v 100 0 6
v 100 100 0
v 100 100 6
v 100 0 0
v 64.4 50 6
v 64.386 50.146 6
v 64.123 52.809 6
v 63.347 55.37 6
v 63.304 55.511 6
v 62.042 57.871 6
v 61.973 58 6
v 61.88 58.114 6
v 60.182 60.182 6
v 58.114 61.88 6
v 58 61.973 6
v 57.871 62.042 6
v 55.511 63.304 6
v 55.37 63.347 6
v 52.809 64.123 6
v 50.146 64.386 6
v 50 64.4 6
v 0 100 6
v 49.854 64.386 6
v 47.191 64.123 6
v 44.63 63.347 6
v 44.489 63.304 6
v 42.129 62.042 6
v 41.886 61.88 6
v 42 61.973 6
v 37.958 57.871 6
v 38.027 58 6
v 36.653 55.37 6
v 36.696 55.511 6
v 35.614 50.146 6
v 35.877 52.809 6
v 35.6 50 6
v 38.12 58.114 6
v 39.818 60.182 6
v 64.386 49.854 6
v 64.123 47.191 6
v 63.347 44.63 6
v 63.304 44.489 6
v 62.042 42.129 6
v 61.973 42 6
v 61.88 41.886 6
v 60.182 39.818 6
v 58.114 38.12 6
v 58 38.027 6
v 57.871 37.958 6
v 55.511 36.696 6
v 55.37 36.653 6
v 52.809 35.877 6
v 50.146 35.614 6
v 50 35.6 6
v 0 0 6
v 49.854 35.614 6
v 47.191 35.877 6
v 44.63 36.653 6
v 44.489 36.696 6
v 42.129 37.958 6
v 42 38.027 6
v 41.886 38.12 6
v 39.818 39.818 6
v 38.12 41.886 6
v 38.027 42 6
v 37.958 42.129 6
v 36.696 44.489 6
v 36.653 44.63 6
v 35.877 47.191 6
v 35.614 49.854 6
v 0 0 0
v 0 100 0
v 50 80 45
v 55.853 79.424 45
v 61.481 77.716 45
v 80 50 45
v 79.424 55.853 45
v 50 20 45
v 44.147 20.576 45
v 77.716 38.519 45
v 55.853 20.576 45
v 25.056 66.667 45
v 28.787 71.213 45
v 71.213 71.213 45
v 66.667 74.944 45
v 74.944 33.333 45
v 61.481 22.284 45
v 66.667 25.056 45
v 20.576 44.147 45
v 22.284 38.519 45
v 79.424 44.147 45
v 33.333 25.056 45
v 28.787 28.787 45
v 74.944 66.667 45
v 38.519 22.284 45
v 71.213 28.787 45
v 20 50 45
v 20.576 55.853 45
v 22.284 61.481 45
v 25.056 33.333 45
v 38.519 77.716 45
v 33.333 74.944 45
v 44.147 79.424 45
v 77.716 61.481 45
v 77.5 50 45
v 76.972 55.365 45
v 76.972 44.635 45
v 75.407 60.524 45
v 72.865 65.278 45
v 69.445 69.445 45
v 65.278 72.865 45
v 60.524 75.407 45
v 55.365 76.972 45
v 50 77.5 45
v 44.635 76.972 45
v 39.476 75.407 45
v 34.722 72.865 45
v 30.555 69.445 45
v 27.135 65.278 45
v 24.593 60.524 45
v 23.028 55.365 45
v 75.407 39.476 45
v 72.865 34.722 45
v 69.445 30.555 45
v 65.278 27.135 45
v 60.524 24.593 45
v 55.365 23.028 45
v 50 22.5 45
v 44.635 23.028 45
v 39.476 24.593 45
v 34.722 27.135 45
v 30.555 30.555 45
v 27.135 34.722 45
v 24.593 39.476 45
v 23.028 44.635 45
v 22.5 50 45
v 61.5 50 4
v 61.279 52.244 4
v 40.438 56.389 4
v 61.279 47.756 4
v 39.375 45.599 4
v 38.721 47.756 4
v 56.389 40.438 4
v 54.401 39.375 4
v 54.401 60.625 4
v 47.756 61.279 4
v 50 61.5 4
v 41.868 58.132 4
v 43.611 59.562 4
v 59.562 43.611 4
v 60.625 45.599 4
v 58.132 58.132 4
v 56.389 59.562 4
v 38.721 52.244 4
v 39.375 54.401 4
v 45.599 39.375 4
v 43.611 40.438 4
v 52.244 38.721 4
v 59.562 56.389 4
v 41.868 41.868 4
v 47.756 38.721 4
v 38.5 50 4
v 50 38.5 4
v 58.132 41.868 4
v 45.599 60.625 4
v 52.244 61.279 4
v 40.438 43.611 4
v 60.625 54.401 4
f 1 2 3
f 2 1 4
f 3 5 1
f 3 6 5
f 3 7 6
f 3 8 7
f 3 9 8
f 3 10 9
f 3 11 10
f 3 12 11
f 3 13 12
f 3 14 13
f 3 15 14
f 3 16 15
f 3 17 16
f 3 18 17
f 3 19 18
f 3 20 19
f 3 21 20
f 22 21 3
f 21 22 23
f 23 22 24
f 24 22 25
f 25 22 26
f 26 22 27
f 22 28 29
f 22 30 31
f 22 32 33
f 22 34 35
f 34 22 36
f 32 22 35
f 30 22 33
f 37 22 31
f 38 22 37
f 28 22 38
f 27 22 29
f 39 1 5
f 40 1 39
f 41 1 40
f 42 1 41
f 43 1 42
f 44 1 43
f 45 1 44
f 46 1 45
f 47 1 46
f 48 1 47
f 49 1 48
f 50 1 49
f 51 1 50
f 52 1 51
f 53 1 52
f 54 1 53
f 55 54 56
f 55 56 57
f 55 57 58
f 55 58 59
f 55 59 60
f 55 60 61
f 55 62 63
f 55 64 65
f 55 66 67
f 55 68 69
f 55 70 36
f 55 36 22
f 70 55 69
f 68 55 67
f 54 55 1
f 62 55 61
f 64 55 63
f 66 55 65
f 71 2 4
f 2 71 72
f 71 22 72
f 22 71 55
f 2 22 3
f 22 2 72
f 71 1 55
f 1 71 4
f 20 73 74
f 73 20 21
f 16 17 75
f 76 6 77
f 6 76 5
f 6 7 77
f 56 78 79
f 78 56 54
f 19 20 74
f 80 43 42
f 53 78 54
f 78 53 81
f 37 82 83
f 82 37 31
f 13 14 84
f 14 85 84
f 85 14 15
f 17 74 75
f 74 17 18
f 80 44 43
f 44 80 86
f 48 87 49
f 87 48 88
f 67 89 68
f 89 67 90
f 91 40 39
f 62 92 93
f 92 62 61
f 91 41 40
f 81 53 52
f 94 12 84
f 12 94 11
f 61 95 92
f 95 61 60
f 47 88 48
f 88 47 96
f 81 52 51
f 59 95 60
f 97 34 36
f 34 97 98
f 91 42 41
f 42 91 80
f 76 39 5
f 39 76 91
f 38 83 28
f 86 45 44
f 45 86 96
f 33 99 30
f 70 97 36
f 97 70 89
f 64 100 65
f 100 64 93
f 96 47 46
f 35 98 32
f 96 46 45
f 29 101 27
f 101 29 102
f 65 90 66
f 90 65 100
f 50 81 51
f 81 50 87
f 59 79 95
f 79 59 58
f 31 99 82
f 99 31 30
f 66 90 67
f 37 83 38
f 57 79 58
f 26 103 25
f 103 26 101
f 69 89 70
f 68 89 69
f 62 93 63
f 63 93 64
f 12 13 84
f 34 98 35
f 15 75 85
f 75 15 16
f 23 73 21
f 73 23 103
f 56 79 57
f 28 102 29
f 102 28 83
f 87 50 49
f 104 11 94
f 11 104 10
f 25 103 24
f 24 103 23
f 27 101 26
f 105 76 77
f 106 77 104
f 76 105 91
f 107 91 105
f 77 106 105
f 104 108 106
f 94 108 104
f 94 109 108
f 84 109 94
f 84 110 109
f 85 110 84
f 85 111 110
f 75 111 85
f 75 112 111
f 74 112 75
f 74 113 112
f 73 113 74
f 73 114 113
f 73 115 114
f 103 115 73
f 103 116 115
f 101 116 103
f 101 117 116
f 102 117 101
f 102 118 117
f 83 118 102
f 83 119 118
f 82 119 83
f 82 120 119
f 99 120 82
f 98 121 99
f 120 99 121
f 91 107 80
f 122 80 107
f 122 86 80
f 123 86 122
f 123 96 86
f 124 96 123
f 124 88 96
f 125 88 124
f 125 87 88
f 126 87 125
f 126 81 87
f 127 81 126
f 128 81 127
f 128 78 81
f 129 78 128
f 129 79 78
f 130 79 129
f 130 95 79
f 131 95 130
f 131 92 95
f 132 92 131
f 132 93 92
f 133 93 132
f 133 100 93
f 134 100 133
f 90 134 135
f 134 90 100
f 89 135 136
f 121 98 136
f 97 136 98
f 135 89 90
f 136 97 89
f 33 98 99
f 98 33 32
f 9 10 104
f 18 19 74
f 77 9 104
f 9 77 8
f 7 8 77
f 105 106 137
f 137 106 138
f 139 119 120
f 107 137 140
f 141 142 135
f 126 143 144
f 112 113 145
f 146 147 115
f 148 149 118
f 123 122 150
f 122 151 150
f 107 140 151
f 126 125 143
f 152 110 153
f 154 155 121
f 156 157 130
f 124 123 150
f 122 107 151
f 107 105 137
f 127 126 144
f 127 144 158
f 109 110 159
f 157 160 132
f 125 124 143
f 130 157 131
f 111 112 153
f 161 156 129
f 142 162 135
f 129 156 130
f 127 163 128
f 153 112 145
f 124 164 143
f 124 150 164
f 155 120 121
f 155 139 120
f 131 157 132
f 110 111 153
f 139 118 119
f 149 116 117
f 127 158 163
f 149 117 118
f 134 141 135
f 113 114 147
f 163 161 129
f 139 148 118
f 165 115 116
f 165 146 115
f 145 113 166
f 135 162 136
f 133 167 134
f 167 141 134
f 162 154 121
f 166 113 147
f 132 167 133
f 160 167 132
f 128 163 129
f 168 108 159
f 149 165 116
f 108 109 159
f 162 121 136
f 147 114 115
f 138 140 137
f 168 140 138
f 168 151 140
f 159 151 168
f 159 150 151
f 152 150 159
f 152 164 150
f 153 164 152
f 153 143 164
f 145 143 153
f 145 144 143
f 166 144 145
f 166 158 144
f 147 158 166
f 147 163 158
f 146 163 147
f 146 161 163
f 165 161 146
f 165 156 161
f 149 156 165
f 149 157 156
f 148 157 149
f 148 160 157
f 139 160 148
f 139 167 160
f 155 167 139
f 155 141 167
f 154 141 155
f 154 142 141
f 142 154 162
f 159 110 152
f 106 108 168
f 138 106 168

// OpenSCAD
$fn = 32;

// ----------------------------------------------------------------------
// Hopper: funnel with square flange
// ----------------------------------------------------------------------

// --- parameters (mm) ---
fl = 100;                 // flange side, X and Y
fl_t = 6;                 // flange thickness
cone_h = 40;              // cone height above the flange
top_d = 60;               // cone mouth diameter
bot_d = 28;               // cone spout diameter
wall = 2.5;               // cone wall thickness

bore_d = bot_d - 2 * wall;  // spout bore diameter
total_h = fl_t + cone_h - 1;  // overall height

difference() {
  union() {
    cube([fl, fl, fl_t]);
    translate([fl / 2, fl / 2, fl_t - 1])
      cylinder(h = cone_h, d1 = bot_d, d2 = top_d);
  }
  translate([fl / 2, fl / 2, fl_t - 2])
    cylinder(h = cone_h + 1, d1 = bore_d, d2 = top_d - 2 * wall);
}
